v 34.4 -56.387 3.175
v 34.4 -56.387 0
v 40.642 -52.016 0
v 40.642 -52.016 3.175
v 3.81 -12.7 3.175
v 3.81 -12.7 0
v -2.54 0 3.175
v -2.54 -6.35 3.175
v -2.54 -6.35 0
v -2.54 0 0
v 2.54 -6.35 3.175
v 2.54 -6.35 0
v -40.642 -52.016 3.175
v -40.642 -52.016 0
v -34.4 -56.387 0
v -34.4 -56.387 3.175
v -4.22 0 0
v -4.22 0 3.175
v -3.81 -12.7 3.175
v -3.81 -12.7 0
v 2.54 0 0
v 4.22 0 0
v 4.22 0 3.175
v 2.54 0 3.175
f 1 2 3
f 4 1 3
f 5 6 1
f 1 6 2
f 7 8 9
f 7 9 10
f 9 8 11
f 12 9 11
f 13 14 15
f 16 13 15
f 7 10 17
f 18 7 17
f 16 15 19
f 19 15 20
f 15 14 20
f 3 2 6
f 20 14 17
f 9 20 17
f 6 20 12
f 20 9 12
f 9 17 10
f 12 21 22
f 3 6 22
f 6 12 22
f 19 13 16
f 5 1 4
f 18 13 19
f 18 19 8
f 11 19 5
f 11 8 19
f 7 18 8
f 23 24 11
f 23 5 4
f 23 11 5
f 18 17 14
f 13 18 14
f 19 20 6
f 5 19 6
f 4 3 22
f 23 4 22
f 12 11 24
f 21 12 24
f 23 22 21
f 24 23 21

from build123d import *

# Parameters (mm, degrees)
BOSS_EXTRUDE1_DEPTH = 3.175
CUT_EXTRUDE1_REACH  = 71.579
SKETCH2_W           = 5.08
SKETCH2_H           = 6.35


with BuildPart() as part:
    # Sketch1 → Boss-Extrude1 (new body)
    with BuildSketch(Plane.XY):
        Polygon((4.219666631, 0), (-4.219666631, 0), (-40.641770339, -52.016154812), (-34.399831762, -56.386807257), (-3.81, -12.7), (3.81, -12.7), (34.399831762, -56.386807257), (40.641770339, -52.016154812), align=None)
    extrude(amount=BOSS_EXTRUDE1_DEPTH)

    # Sketch2 → Cut-Extrude1 (cut, up to next)
    with BuildSketch(Plane.XY.offset(3.175), mode=Mode.PRIVATE) as cut_extrude1_sk1:
        with Locations((0, -3.175)):
            Rectangle(SKETCH2_W, SKETCH2_H)
    cut_extrude1_tool1 = extrude(cut_extrude1_sk1.sketch, amount=-CUT_EXTRUDE1_REACH, mode=Mode.PRIVATE) & part.part
    add(cut_extrude1_tool1.solids().sort_by_distance((0, -3.175, 3.175))[0], mode=Mode.SUBTRACT)


solid = part.part
